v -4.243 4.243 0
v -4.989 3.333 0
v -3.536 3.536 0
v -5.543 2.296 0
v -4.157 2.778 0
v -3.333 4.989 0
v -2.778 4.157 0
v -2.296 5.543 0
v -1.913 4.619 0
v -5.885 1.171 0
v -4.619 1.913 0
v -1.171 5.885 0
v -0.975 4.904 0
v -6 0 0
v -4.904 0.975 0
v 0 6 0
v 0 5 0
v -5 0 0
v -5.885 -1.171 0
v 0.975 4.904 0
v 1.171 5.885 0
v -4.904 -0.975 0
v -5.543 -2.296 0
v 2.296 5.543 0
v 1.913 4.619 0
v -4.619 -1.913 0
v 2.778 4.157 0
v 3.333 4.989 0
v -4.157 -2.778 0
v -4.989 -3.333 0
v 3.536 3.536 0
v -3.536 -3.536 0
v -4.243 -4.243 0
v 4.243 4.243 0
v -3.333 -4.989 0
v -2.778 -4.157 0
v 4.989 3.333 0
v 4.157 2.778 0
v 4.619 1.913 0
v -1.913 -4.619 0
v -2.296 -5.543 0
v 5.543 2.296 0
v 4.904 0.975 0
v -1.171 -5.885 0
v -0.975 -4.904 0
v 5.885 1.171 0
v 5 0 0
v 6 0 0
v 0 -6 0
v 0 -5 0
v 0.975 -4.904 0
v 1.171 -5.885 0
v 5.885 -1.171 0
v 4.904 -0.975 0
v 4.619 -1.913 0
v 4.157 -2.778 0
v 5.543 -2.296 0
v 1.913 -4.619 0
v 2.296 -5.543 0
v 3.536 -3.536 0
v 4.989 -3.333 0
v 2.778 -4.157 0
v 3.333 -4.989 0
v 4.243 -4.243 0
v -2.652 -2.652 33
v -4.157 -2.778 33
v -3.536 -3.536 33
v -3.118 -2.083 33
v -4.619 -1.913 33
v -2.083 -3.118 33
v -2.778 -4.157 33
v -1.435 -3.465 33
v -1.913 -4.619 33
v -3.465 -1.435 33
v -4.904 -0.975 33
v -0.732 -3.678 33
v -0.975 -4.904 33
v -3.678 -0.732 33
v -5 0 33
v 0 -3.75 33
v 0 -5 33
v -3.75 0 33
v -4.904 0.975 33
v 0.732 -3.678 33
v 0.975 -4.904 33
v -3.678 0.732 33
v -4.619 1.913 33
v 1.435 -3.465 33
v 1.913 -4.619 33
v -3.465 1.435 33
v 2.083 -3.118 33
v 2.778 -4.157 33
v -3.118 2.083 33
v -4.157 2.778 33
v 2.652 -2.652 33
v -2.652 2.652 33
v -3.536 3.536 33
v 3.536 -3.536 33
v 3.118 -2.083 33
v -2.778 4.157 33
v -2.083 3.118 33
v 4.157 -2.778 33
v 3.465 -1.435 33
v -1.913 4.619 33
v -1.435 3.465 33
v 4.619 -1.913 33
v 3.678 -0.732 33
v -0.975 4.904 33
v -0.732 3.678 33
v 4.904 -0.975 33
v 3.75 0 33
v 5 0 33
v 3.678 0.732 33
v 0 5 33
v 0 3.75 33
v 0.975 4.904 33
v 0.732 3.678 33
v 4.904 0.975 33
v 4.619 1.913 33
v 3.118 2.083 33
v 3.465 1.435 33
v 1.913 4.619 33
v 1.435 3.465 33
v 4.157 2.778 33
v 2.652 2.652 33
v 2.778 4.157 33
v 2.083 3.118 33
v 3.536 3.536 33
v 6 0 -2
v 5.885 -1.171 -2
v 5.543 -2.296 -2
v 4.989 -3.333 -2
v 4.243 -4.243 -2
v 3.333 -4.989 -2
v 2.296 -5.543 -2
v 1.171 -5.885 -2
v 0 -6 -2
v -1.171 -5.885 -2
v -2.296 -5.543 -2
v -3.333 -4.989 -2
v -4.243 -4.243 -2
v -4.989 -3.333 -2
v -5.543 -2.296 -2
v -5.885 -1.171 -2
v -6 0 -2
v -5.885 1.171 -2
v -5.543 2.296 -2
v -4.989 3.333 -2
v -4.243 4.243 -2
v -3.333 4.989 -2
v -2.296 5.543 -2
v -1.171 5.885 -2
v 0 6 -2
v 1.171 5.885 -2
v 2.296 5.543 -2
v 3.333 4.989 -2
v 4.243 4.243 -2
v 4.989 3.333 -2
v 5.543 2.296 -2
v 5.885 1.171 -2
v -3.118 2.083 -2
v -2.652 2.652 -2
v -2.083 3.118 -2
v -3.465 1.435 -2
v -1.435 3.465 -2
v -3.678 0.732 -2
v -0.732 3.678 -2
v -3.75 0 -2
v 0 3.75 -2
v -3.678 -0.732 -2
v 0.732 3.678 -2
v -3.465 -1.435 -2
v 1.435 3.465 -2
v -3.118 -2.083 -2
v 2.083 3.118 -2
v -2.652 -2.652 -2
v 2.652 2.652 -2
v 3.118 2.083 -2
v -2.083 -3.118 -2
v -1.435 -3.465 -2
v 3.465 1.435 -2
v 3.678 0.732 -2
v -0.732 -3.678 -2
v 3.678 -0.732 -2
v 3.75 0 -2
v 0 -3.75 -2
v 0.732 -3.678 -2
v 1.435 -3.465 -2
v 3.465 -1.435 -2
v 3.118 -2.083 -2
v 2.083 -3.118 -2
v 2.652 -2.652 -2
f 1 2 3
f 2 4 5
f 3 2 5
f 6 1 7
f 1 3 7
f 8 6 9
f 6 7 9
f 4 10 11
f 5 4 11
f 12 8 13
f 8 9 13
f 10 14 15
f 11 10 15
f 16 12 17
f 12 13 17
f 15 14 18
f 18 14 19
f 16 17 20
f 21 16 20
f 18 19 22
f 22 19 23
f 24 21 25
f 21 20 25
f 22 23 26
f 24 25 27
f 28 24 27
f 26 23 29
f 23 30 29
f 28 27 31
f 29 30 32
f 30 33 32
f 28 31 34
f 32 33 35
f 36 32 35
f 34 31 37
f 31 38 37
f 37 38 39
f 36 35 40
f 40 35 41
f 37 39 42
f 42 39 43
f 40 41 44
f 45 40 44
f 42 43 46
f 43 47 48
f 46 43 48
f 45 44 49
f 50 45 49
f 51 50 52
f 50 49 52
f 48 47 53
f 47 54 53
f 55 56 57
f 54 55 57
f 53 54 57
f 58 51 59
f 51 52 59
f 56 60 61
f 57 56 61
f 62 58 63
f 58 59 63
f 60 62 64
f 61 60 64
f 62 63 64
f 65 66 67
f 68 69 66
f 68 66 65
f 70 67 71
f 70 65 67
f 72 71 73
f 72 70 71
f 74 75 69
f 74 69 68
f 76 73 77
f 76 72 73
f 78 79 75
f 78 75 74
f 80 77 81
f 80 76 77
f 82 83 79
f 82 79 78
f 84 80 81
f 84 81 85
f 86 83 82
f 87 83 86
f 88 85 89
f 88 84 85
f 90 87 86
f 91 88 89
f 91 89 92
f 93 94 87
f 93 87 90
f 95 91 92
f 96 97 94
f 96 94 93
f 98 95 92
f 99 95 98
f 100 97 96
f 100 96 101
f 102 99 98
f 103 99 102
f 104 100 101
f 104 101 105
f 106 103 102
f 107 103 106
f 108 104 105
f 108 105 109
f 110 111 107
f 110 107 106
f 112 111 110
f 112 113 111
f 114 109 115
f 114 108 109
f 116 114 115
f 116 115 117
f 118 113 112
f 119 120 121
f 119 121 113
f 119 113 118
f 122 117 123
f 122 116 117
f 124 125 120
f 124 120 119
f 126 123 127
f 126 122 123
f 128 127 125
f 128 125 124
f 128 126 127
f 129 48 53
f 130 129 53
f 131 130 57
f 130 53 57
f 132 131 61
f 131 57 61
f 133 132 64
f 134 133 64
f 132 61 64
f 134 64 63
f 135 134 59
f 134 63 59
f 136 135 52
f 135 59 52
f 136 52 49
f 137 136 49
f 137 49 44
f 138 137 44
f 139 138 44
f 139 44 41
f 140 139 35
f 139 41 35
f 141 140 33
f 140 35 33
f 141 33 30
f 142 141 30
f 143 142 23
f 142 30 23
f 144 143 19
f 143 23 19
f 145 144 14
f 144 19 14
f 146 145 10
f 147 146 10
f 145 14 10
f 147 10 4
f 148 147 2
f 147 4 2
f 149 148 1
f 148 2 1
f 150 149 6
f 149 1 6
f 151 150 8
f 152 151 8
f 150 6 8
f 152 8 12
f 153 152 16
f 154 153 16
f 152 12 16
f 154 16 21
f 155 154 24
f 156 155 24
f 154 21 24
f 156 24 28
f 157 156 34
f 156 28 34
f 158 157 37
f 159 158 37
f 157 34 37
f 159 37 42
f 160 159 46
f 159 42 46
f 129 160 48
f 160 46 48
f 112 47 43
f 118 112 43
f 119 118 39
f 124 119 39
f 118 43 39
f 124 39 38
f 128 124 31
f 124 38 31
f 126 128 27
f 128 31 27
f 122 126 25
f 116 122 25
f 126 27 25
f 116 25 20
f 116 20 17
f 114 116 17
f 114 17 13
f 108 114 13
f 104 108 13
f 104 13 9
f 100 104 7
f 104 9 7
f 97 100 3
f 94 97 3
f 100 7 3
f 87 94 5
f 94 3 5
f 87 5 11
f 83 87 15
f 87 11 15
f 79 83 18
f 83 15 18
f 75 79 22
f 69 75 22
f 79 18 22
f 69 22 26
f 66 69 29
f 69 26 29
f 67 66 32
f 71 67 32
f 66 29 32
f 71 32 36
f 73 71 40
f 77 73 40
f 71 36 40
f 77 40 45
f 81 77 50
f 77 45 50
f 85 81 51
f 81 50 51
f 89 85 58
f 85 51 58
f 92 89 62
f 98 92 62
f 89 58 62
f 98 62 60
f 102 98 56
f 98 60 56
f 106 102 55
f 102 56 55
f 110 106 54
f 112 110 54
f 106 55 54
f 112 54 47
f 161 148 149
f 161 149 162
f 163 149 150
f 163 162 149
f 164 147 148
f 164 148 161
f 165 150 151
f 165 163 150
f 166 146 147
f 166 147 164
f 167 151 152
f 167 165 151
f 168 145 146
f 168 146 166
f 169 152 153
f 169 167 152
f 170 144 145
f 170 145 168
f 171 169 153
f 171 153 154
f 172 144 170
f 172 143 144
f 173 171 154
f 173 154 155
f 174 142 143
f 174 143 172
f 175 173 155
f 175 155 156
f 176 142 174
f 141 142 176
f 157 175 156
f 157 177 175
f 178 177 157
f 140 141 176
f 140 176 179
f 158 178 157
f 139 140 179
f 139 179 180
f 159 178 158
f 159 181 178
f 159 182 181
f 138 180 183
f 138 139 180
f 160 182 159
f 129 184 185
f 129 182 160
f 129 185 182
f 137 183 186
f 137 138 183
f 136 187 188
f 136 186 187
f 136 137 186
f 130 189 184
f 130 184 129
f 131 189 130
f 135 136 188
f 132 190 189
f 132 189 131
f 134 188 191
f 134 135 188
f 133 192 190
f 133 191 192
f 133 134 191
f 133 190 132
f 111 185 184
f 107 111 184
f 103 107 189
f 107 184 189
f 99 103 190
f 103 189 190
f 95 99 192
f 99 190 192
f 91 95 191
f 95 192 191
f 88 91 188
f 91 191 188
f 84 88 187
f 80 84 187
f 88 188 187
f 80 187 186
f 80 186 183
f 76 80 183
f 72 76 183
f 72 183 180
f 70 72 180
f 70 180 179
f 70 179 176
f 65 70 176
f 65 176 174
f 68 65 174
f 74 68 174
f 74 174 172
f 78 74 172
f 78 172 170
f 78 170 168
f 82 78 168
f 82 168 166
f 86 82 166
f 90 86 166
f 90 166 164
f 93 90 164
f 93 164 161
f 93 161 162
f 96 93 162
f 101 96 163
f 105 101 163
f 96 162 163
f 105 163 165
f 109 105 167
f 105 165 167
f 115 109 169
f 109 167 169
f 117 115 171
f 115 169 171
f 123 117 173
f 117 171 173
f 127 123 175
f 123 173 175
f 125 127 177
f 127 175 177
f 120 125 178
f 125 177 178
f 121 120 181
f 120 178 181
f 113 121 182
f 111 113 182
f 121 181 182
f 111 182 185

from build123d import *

# Parameters (mm, degrees)
F0_R     = 5
F1_DEPTH = 33
F2_R     = 6
F3_DEPTH = 2
F4_R     = 3.75
F5_DEPTH = 35.001


with BuildPart() as f1:
    # F0 (on Top) → F1 (new body)
    with BuildSketch(Plane.XY):
        Circle(F0_R)
    extrude(amount=F1_DEPTH)

    # F2 (on face) → F3 (join)
    with BuildSketch(Plane(origin=(0, 0, 0), x_dir=(1, 0, 0), z_dir=(0, 0, -1))):
        Circle(F2_R)
    extrude(amount=F3_DEPTH)

    # F4 (on face) → F5 (cut, through all)
    with BuildSketch(Plane(origin=(0, 0, -2), x_dir=(1, 0, 0), z_dir=(0, 0, -1))):
        Circle(F4_R)
    extrude(amount=-F5_DEPTH, mode=Mode.SUBTRACT)


solid = f1.part
